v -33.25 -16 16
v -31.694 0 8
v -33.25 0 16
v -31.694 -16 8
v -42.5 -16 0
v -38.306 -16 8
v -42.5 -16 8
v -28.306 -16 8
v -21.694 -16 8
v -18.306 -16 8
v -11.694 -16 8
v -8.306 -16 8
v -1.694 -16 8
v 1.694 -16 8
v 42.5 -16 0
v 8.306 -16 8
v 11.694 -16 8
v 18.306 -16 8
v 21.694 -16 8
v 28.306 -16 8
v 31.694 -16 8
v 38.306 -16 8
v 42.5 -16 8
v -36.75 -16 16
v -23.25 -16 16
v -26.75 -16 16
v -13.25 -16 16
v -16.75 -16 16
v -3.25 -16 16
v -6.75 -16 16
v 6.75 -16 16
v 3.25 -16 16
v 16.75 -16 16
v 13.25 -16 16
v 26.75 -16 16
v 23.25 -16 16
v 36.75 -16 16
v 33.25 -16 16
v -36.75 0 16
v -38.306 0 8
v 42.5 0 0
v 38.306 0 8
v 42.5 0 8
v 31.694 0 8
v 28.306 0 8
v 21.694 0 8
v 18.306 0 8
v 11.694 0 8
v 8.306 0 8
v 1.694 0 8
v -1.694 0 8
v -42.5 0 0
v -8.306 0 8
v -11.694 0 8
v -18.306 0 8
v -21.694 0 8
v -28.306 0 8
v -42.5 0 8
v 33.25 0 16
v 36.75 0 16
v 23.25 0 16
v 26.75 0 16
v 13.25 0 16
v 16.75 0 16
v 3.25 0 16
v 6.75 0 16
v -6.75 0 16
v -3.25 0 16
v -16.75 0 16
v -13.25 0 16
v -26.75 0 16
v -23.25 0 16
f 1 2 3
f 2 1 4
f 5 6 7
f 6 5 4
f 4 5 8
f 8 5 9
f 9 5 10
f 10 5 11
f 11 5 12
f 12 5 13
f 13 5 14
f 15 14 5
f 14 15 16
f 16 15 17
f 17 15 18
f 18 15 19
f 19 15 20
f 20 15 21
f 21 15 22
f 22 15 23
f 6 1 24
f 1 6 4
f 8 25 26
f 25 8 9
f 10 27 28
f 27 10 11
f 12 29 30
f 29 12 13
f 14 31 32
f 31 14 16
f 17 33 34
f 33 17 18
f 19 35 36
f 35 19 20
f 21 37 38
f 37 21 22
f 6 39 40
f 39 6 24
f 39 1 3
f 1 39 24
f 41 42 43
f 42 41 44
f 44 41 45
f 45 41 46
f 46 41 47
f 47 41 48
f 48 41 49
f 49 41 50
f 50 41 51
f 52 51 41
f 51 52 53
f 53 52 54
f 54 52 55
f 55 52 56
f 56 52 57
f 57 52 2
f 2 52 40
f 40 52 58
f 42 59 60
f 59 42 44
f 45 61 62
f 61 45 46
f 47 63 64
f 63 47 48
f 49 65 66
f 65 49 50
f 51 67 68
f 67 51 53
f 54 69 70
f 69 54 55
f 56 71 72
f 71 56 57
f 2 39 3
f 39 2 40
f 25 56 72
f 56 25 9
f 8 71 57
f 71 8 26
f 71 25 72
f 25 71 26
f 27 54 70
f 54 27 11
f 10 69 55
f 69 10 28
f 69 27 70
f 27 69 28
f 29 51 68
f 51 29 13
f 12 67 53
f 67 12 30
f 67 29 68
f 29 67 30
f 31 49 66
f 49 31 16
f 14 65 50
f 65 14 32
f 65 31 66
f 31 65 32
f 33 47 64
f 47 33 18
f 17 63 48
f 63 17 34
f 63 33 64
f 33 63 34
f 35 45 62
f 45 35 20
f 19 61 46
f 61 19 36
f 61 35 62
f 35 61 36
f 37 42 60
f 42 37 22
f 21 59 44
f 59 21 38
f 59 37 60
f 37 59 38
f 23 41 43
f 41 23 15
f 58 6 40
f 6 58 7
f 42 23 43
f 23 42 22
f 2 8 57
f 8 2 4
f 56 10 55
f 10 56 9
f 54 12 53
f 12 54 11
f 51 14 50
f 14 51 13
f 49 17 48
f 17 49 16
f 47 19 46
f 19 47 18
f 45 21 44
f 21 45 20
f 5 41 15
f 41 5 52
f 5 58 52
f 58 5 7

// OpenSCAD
$fn = 32;

// ----------------------------------------------------------------------
// Toothed rack, 8 teeth
// 10 mm pitch, 8 mm teeth
// ----------------------------------------------------------------------

// --- parameters (mm) ---
bar_w = 16;     // bar width (Y)
bar_h = 8;      // bar height (Z)
teeth = 8;      // number of teeth
pitch = 10;     // tooth pitch
tooth_h = 8;    // tooth height above the bar
root_w = 7;     // tooth width at the root
crest_w = 3.5;  // tooth width at the crest

// --- derived feature positions (mm) ---
span = (teeth - 1) * pitch;  // = 70   distance between the outer teeth
bar_l = span + root_w + 8;   // = 85   bar length: teeth plus 4 mm at each end
tooth_x = -span / 2;         // = -35   X of the first tooth
height = bar_h + tooth_h;    // = 16   overall height
feature_centers = [
  [tooth_x + 0 * pitch, -bar_w / 2],
  [tooth_x + 1 * pitch, -bar_w / 2],
  [tooth_x + 2 * pitch, -bar_w / 2],
  [tooth_x + 3 * pitch, -bar_w / 2],
  [tooth_x + 4 * pitch, -bar_w / 2],
  [tooth_x + 5 * pitch, -bar_w / 2],
  [tooth_x + 6 * pitch, -bar_w / 2],
  [tooth_x + 7 * pitch, -bar_w / 2]
];   // tooth centre line, drives the tooth loop

// bar with a rack of teeth, one extruded trapezoium per centre
module rack_tooth() {
  linear_extrude(height = bar_w)
    polygon(points = [
      [0, 0],
      [root_w, 0],
      [root_w / 2 + crest_w / 2, tooth_h + 1],
      [root_w / 2 - crest_w / 2, tooth_h + 1]
    ]);
}

union() {
  translate([-bar_l / 2, -bar_w, 0]) cube([bar_l, bar_w, bar_h]);
  for (centre = feature_centers)
    translate([centre[0] - root_w / 2, 0, bar_h - 1]) rotate([90, 0, 0]) rack_tooth();
}
